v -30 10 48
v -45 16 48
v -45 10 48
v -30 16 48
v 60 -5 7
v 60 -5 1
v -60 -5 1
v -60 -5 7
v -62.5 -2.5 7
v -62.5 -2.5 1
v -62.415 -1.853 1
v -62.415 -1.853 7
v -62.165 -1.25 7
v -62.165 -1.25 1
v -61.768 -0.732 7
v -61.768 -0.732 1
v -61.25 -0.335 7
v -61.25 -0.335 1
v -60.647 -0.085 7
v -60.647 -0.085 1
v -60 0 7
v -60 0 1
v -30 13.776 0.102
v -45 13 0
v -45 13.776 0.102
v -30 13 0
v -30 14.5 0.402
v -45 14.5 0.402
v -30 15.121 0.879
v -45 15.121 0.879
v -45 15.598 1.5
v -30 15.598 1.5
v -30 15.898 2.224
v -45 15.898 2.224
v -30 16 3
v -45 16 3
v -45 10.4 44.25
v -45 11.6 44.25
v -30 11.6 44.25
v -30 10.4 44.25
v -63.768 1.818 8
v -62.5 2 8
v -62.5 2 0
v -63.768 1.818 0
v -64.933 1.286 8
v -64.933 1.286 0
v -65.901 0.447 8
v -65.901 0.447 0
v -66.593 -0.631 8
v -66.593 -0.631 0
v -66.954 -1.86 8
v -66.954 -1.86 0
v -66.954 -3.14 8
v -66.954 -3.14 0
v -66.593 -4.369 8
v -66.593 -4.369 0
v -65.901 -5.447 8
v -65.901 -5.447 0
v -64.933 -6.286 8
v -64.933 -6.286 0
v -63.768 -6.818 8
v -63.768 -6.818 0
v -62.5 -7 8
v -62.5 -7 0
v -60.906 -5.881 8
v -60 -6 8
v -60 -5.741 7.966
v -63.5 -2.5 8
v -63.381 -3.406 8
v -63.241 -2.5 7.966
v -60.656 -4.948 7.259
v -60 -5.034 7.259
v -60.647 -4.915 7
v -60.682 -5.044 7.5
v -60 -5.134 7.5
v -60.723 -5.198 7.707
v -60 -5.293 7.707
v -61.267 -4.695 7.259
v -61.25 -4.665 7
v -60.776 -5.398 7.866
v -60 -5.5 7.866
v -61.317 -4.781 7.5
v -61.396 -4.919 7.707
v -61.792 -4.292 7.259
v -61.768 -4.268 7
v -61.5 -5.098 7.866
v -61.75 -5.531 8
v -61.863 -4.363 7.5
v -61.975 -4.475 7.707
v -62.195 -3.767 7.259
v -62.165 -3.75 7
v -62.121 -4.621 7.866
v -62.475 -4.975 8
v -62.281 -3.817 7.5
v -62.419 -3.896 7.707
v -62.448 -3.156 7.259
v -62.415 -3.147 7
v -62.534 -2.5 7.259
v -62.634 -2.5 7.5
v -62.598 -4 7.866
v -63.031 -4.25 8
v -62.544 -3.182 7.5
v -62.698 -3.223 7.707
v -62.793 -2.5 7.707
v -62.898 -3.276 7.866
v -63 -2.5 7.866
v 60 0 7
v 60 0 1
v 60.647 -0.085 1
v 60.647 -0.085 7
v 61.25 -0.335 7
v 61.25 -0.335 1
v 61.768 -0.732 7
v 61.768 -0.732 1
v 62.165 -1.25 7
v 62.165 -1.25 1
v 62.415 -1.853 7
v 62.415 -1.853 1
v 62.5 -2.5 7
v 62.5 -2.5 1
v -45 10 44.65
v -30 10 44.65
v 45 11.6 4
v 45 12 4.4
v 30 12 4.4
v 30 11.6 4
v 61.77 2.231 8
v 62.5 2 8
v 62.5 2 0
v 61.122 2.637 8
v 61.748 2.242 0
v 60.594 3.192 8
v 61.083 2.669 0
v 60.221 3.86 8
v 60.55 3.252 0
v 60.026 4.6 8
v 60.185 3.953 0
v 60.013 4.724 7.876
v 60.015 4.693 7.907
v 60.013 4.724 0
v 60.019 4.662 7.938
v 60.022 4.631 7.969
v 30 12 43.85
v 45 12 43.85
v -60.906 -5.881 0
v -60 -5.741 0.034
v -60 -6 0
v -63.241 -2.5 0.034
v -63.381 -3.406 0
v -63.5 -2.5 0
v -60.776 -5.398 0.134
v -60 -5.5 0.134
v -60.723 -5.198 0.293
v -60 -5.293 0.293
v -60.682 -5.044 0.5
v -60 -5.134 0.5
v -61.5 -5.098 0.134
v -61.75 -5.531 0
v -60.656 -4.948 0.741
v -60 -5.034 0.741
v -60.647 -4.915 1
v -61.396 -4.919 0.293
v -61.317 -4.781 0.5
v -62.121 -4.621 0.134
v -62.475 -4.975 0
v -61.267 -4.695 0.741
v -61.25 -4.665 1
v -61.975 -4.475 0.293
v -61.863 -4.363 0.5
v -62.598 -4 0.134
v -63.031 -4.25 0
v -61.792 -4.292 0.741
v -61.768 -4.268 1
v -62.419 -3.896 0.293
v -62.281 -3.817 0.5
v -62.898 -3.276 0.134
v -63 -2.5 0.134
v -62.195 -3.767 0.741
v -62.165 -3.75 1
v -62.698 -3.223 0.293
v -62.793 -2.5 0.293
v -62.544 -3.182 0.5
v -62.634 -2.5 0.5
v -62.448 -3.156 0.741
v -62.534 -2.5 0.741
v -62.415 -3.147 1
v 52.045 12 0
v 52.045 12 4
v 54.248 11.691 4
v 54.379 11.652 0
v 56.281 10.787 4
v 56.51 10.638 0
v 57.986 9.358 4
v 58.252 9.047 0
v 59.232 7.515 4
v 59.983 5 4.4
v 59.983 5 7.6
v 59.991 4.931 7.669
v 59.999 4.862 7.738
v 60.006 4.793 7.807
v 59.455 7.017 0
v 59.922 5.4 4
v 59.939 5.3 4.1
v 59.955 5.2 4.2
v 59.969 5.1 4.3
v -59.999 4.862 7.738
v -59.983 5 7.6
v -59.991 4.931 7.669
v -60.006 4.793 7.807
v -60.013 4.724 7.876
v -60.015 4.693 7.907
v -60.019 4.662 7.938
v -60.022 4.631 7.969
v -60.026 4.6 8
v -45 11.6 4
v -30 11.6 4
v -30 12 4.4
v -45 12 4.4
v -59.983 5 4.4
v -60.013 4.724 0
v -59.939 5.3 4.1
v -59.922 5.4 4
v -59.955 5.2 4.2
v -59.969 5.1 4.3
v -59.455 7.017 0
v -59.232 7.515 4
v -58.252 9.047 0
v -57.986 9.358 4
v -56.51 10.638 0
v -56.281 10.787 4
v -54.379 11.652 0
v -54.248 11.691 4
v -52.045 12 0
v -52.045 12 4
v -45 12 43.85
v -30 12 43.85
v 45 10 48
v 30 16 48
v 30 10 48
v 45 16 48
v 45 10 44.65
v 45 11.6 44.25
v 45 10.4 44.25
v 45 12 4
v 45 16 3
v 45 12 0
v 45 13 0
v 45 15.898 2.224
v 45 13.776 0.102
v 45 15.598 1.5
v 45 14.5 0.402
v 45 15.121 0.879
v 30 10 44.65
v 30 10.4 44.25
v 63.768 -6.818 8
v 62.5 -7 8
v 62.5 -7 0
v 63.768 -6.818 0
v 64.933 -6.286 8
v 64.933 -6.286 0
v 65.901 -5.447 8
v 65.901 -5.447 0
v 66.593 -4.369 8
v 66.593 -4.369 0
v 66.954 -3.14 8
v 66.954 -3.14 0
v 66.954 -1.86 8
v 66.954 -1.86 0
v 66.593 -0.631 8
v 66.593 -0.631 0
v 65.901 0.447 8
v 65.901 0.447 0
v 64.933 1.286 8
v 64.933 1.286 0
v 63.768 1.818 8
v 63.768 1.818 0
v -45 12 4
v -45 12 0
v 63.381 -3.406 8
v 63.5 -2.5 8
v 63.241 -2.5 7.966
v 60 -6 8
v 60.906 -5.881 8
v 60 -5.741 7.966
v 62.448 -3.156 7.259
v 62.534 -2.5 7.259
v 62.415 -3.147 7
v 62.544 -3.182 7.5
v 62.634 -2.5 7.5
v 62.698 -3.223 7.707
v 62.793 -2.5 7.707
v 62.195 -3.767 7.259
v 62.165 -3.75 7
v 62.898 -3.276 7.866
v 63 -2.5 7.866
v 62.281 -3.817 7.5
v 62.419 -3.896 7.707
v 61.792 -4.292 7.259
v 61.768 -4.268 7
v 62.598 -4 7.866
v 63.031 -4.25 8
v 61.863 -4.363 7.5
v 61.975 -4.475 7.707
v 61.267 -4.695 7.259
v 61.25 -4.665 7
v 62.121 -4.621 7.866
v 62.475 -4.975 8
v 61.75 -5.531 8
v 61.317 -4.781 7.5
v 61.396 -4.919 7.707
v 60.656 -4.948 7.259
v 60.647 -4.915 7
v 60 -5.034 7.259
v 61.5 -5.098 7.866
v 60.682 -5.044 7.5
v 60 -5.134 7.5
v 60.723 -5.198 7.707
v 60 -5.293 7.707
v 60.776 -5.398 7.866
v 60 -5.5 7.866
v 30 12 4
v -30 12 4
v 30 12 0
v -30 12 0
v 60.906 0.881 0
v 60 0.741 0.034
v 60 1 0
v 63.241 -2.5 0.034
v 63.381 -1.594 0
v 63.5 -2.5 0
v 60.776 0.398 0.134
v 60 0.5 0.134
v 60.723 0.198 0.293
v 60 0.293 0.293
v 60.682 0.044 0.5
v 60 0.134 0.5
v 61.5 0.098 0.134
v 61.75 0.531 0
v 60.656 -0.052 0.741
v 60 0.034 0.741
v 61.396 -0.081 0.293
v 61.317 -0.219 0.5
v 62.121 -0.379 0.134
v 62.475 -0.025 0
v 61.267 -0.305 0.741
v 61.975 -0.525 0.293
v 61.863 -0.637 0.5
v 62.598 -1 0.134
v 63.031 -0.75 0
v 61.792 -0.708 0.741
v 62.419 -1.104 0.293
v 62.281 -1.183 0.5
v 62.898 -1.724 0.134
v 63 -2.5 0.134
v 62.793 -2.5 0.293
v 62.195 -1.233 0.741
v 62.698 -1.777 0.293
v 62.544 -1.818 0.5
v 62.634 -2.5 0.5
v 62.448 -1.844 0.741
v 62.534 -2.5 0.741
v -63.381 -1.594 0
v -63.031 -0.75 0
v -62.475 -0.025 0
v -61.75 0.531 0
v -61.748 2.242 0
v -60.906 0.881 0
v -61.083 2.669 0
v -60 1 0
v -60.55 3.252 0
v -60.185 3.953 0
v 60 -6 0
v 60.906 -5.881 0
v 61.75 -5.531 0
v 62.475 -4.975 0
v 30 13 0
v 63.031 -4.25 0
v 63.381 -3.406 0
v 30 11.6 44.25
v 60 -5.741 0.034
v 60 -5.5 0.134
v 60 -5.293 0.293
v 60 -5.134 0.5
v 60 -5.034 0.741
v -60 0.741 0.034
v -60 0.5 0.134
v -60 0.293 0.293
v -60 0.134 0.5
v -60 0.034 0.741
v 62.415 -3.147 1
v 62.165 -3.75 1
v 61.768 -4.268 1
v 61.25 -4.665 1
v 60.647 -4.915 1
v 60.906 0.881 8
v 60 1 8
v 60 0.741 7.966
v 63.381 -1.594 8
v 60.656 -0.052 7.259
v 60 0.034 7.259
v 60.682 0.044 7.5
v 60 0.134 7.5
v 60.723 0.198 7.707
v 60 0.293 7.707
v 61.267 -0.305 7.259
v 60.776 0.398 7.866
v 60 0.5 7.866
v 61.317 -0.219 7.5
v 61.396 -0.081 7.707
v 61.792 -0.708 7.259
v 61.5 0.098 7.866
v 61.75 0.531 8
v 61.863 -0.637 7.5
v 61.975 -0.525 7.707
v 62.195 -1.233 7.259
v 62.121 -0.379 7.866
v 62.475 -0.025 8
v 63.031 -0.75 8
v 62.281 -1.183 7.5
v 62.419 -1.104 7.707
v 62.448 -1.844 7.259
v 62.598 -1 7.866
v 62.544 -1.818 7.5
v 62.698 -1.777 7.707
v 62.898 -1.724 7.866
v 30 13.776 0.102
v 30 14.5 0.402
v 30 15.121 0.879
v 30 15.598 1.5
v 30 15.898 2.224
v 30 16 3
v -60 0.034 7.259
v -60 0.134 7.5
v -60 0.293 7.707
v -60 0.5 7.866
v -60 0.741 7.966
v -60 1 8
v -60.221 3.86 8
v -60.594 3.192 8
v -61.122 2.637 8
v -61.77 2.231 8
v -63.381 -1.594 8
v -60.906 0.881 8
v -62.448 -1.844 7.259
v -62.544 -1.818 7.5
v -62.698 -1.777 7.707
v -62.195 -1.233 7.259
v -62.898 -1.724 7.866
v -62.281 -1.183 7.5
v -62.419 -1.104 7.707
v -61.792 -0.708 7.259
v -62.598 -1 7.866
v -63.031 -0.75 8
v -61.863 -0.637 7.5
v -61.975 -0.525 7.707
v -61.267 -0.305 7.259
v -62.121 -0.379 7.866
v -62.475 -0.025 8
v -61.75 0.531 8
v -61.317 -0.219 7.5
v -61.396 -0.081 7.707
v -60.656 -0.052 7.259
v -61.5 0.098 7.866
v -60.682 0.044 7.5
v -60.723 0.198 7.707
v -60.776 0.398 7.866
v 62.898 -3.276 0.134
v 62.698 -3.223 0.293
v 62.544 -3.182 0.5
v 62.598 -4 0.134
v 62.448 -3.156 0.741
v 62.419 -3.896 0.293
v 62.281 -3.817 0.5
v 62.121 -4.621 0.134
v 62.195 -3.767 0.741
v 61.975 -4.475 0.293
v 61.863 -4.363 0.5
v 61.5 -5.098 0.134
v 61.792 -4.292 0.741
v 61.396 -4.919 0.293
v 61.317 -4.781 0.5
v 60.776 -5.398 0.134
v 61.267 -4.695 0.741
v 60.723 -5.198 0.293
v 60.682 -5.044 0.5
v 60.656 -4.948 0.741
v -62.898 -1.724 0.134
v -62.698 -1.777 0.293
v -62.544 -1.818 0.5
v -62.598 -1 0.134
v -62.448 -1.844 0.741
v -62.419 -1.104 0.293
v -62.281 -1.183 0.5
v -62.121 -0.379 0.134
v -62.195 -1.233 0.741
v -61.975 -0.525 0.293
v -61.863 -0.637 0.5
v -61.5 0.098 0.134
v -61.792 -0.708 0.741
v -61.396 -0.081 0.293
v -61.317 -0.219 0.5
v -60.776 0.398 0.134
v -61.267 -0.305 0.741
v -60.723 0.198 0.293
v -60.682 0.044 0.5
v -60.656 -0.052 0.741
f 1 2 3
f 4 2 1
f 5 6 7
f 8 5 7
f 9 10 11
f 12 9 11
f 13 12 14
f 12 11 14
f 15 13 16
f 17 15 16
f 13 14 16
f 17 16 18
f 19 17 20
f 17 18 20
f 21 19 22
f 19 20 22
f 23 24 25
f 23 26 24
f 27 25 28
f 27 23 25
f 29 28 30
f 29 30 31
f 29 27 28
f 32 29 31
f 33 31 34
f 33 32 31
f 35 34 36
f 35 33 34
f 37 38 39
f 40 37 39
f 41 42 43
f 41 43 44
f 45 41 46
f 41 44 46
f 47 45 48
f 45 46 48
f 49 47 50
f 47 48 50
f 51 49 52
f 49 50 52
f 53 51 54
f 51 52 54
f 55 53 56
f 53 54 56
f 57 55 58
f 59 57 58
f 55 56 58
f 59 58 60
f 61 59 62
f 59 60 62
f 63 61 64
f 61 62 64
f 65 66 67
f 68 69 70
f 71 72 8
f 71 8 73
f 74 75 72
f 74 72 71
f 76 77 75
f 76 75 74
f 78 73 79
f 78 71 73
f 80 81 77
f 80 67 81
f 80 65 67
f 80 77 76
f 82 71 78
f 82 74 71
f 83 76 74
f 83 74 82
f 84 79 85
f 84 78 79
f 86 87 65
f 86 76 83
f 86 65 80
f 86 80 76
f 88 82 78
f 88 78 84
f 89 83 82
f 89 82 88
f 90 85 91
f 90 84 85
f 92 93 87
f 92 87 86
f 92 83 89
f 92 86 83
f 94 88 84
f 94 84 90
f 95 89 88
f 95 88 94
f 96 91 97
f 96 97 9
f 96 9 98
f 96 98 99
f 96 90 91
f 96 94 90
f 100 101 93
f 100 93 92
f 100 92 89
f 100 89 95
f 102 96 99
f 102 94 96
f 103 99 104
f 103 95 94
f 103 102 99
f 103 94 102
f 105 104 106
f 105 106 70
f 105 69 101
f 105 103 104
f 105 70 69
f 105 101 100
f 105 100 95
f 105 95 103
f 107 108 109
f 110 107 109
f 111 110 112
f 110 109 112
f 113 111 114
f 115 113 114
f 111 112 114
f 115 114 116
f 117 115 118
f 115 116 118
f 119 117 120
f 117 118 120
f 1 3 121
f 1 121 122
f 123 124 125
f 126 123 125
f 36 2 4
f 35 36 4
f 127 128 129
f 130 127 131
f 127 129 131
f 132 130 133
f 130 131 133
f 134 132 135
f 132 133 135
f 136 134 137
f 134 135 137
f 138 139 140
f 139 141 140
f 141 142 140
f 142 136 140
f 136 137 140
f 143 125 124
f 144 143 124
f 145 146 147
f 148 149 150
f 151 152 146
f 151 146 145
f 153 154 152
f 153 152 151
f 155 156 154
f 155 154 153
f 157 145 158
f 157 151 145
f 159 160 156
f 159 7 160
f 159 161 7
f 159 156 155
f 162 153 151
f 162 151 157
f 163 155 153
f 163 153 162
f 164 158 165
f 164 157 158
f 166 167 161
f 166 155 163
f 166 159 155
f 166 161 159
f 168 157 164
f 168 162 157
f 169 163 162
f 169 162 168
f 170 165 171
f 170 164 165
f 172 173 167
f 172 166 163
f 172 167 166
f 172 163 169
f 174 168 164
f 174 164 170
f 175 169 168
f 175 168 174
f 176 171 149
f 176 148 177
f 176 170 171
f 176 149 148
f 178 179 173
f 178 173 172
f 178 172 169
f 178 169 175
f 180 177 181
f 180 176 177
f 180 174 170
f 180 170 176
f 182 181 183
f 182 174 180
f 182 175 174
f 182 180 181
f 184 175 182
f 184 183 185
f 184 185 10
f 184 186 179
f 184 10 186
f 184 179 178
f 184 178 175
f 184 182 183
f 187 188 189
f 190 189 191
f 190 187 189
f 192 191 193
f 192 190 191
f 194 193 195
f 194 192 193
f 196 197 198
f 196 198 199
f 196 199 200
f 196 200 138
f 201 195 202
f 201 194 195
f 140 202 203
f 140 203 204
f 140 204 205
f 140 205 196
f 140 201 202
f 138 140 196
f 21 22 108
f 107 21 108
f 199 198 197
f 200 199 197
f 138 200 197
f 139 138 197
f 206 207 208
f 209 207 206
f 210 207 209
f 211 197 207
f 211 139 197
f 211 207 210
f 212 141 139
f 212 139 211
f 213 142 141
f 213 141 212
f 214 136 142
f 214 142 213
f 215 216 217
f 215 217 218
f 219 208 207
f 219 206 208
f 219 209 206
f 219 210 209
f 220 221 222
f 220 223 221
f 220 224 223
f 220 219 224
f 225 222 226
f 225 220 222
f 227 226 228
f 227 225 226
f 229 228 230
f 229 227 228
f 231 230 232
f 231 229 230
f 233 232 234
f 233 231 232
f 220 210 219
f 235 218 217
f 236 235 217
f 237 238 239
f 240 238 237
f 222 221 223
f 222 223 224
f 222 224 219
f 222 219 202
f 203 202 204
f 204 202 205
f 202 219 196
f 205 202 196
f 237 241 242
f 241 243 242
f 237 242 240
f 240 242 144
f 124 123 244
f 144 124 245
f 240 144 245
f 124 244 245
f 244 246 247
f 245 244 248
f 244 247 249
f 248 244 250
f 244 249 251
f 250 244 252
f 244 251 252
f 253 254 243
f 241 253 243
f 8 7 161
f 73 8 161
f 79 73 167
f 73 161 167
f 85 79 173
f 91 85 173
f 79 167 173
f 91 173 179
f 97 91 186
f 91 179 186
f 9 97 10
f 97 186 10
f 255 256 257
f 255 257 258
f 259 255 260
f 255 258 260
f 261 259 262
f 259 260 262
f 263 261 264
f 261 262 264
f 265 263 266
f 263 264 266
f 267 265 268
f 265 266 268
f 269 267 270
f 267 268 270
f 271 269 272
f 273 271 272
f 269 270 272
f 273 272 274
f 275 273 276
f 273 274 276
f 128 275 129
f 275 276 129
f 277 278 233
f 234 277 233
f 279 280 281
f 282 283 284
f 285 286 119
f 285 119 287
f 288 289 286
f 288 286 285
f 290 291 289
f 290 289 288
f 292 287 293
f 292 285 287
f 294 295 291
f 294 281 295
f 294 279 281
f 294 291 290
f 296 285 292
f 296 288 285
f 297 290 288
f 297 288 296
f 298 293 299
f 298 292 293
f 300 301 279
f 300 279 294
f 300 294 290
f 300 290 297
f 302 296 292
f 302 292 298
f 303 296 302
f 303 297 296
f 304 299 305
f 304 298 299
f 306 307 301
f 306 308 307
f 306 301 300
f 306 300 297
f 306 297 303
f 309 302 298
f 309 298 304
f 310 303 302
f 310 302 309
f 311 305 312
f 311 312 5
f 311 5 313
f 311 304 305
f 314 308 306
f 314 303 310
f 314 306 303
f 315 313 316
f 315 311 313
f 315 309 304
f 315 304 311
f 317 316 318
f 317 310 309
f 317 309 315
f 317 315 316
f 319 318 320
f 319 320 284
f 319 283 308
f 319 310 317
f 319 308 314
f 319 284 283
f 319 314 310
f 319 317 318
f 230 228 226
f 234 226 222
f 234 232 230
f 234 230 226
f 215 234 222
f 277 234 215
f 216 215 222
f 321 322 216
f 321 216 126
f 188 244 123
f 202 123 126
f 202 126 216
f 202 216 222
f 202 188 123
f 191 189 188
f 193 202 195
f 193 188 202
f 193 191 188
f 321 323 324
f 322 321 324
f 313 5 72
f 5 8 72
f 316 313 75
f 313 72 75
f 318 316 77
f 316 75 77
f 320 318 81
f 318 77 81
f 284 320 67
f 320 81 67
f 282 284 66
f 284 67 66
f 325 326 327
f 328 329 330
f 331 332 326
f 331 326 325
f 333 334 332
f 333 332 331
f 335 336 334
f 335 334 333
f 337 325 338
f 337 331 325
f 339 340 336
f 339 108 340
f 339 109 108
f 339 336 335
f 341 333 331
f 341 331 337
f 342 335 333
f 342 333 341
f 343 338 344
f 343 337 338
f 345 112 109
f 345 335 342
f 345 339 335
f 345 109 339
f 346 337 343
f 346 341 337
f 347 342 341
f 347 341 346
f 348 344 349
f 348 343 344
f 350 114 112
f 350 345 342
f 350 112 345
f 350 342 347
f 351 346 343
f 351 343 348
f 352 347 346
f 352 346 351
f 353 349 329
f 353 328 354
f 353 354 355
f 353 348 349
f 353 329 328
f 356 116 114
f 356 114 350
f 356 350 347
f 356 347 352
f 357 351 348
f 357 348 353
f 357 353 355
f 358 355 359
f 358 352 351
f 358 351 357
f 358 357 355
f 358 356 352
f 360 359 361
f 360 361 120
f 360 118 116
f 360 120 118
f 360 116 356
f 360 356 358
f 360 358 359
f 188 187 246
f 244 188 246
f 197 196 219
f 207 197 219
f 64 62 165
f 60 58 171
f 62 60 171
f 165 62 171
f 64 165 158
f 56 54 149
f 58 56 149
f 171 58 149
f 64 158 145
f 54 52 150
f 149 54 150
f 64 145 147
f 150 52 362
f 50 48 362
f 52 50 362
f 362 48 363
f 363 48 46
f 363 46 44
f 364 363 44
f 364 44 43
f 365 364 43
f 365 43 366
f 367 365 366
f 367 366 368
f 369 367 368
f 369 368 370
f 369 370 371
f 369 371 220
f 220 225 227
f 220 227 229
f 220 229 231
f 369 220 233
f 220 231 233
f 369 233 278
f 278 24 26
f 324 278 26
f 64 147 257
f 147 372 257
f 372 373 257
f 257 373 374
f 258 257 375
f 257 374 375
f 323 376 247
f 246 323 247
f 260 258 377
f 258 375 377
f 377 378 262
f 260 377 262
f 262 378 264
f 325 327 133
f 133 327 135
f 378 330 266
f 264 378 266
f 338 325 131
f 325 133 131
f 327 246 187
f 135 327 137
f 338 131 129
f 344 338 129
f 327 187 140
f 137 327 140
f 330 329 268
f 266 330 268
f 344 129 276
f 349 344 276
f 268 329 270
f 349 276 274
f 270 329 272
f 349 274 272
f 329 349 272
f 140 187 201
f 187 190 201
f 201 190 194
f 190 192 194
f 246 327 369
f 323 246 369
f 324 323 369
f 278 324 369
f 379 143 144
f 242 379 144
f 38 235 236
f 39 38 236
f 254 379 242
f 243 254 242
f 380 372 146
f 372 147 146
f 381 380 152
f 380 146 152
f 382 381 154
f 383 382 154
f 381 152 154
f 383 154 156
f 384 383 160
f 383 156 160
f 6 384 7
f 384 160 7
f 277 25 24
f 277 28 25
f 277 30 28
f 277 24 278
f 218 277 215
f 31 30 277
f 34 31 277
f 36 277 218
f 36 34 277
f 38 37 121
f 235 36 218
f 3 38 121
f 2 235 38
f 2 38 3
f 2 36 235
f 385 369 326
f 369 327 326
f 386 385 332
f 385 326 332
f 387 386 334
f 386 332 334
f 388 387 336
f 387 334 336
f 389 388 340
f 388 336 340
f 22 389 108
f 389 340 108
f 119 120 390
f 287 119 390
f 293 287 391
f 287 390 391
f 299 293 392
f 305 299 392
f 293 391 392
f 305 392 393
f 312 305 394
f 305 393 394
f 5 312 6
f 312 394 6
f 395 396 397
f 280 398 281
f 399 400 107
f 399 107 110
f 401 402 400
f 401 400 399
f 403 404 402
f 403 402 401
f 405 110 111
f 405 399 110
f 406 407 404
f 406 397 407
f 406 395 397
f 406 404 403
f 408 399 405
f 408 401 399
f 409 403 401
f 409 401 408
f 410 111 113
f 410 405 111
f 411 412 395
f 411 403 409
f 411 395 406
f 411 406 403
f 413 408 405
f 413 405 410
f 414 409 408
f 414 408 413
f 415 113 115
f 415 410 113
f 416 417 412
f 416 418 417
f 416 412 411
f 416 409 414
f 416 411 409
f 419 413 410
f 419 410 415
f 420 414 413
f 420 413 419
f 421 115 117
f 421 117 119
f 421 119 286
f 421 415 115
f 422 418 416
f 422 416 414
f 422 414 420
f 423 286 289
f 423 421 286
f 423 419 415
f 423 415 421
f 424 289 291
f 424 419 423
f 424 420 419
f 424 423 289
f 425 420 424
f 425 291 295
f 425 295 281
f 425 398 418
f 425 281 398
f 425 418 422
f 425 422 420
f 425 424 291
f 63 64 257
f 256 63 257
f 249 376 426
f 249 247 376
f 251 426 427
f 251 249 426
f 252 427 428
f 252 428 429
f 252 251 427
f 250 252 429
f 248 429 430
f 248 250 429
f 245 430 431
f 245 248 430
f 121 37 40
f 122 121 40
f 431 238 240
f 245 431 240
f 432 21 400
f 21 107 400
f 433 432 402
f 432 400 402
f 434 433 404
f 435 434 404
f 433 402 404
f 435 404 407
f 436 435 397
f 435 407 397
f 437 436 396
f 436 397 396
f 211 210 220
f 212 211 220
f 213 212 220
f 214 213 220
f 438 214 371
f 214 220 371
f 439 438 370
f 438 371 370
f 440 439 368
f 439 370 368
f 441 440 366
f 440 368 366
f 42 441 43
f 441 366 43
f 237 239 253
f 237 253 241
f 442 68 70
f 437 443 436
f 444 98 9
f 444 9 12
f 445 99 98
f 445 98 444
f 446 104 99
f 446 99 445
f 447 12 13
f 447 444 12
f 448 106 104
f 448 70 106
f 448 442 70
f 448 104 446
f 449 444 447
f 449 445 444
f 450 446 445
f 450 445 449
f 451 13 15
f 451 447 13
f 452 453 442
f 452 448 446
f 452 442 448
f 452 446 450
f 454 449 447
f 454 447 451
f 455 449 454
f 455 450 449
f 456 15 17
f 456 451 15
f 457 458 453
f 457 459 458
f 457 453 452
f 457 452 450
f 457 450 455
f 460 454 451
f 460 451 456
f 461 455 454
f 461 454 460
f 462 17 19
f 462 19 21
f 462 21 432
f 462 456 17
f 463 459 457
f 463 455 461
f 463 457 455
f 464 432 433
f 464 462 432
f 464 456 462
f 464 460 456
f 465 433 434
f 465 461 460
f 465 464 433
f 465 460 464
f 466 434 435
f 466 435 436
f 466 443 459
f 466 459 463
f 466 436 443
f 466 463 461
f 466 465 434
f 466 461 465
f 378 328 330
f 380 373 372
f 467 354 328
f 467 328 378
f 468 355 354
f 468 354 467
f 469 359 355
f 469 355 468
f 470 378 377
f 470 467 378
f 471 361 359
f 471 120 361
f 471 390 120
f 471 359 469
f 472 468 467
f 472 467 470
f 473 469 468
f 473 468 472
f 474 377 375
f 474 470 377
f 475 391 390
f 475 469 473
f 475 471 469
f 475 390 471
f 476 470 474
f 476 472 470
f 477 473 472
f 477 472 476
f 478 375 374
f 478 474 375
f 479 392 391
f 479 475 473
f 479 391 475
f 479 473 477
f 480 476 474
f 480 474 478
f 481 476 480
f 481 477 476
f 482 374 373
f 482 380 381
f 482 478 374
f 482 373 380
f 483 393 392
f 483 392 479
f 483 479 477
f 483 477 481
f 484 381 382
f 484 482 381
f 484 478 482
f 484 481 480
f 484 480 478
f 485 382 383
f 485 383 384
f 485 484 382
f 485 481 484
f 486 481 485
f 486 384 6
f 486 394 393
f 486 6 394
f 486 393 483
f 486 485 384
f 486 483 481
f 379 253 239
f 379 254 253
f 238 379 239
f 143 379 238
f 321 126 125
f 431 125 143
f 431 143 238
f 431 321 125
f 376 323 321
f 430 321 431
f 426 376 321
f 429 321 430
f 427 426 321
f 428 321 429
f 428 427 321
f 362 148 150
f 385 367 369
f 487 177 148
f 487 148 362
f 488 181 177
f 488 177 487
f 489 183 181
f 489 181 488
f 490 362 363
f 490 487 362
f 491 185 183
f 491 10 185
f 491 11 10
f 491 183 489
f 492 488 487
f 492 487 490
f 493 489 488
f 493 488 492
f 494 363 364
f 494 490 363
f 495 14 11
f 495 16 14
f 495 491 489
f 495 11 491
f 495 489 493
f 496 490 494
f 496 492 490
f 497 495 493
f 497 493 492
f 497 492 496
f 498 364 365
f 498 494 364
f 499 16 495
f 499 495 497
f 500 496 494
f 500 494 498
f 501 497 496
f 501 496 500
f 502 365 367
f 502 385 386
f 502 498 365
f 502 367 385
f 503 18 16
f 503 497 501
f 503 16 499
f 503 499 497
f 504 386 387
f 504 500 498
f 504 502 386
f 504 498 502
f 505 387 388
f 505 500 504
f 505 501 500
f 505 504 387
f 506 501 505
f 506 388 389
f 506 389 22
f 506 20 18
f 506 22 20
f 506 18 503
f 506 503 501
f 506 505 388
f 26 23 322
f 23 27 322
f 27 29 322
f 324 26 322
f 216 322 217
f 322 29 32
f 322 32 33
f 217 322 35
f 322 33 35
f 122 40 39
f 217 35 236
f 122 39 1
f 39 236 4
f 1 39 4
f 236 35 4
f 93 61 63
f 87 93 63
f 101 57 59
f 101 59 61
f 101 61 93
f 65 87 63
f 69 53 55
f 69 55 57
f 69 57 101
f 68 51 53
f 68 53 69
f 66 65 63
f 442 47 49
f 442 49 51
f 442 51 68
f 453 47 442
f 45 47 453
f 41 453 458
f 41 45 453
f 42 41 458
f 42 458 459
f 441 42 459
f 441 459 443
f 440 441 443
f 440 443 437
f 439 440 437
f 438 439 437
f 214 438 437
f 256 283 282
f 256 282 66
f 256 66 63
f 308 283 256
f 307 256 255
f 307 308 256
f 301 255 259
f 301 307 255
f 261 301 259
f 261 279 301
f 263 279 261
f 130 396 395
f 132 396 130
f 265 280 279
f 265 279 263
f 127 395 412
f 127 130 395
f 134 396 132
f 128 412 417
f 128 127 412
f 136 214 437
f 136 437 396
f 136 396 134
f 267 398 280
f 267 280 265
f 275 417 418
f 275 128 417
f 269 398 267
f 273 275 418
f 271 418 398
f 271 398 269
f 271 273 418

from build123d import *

# Parameters (mm, degrees)
F1_DEPTH    = 8
F2_DEPTH    = 8
F3_DEPTH    = 4
F0_W        = 15
F0_H        = 4
F4_DEPTH    = 48
F5_W        = 15
F5_H        = 3.75
F6_DEPTH    = 2
F7_T1_DEPTH = 43.7732905232
F8_R        = 1
F9_R        = 1
F10_R       = 3
F11_SIZE    = 0.4


# Not quite as in the source:
# - a fillet or chamfer that OpenCascade refuses, or shapes differently, is made with other operations: its cross-section is extruded or revolved along the edge and cut away or added


with BuildPart() as f1:
    # F0 (on Top) → F1 (new body)
    with BuildSketch(Plane.XY):
        with BuildLine():
            Line((60, -5), (-60, -5))
            ThreePointArc((-60, -5), (-61.767766953, -4.267766953), (-62.5, -2.5))
            Line((-62.5, -2.5), (-62.5, -7))
            Line((-62.5, -7), (62.5, -7))
            Line((62.5, -7), (62.5, -2.5))
            ThreePointArc((62.5, -2.5), (61.767766953, -4.267766953), (60, -5))
        make_face()
        with BuildLine():
            Line((62.5, 2), (62.5, -2.5))
            Line((62.5, -2.5), (62.5, -7))
            ThreePointArc((62.5, -7), (67, -2.5), (62.5, 2))
        make_face()
        with BuildLine():
            Line((-62.5, -7), (-62.5, -2.5))
            Line((-62.5, -2.5), (-62.5, 2))
            ThreePointArc((-62.5, 2), (-67, -2.5), (-62.5, -7))
        make_face()
        with BuildLine():
            ThreePointArc((-62.5, -2.5), (-61.767766953, -0.732233047), (-60, 0))
            Line((-60, 0), (60, 0))
            ThreePointArc((60, 0), (61.767766953, -0.732233047), (62.5, -2.5))
            Line((62.5, -2.5), (62.5, 2))
            Line((62.5, 2), (-62.5, 2))
            Line((-62.5, 2), (-62.5, -2.5))
        make_face()
    extrude(amount=F1_DEPTH)

    # F0 (on Top) → F2 (join)
    with BuildSketch(Plane.XY):
        with BuildLine():
            ThreePointArc((-60, 5), (-60.7069250972, 3.047437581), (-62.5, 2))
            Line((-62.5, 2), (62.5, 2))
            ThreePointArc((62.5, 2), (60.7069250972, 3.047437581), (60, 5))
            Line((60, 5), (-60, 5))
        make_face()
    extrude(amount=F2_DEPTH)

    # F0 (on Top) → F3 (join)
    with BuildSketch(Plane.XY):
        Polygon((-60, 12), (-60, 5), (60, 5), (60, 12), (45, 12), (30, 12), (-30, 12), (-45, 12), align=None)
    extrude(amount=F3_DEPTH)

    # F0 (on Top) → F4 (join)
    with BuildSketch(Plane.XY):
        with Locations((-37.5, 14)):
            Rectangle(F0_W, F0_H)
        with Locations((37.5, 14)):
            Rectangle(F0_W, F0_H)
    extrude(amount=F4_DEPTH)

    # F5 (on face) → F6 (join)
    with BuildSketch(Plane.XZ.offset(-12)):
        with Locations((-37.5, 46.125)):
            Rectangle(F5_W, F5_H)
        with Locations((37.5, 46.125)):
            Rectangle(F5_W, F5_H)
    extrude(amount=F6_DEPTH)

    # F7: fillet of radius 8 on 2 edges, made by hand

    # F7_s2 → F7_t1 (cut)
    with BuildSketch(Plane.XY.offset(-19.8866452616)):
        with BuildLine():
            ThreePointArc((52.0453418954, 12), (57.4401609283, 9.9072775118), (60.0125151838, 4.7239819005))
            Line((60.0125151838, 4.7239819005), (60.8092325126, 4.7963800905))
            ThreePointArc((60.8092325126, 4.7963800905), (60.8, 5), (60.8, 12))
            Line((60.8, 12), (60, 12.8))
            Line((60, 12.8), (52.0453418954, 12.8))
            Line((52.0453418954, 12.8), (52.0453418954, 12))
        make_face()
        with BuildLine():
            ThreePointArc((-60.0125151838, 4.7239819005), (-57.4401609283, 9.9072775118), (-52.0453418954, 12))
            Line((-52.0453418954, 12), (-52.0453418954, 12.8))
            Line((-52.0453418954, 12.8), (-60, 12.8))
            Line((-60, 12.8), (-60.8, 12))
            ThreePointArc((-60.8, 12), (-60.8, 5), (-60.8092325126, 4.7963800905))
            Line((-60.8092325126, 4.7963800905), (-60.0125151838, 4.7239819005))
        make_face()
    extrude(amount=F7_T1_DEPTH, mode=Mode.SUBTRACT)

    # F8
    f8_edges = [f1.edges().sort_by_distance(p)[0] for p in [
        (0, 0, 8),
    ]]
    fillet(f8_edges, radius=F8_R)

    # F9
    f9_edges = [f1.edges().sort_by_distance(p)[0] for p in [
        (0, -5, 0),
        (62.5, -2.5, 0),
        (-62.5, -2.5, 0),
        (0, 0, 0),
    ]]
    fillet(f9_edges, radius=F9_R)

    # F10
    f10_edges = [f1.edges().sort_by_distance(p)[0] for p in [
        (-37.5, 16, 0),
        (37.5, 16, 0),
    ]]
    fillet(f10_edges, radius=F10_R)

    # F11
    f11_edges = [f1.edges().sort_by_distance(p)[0] for p in [
        (0, 5, 4),
        (-37.5, 12, 4),
        (37.5, 12, 4),
        (0, 5, 8),
        (37.5, 12, 44.25),
        (-37.5, 12, 44.25),
        (-37.5, 10, 44.25),
        (37.5, 10, 44.25),
    ]]
    chamfer(f11_edges, length=F11_SIZE)


solid = f1.part
